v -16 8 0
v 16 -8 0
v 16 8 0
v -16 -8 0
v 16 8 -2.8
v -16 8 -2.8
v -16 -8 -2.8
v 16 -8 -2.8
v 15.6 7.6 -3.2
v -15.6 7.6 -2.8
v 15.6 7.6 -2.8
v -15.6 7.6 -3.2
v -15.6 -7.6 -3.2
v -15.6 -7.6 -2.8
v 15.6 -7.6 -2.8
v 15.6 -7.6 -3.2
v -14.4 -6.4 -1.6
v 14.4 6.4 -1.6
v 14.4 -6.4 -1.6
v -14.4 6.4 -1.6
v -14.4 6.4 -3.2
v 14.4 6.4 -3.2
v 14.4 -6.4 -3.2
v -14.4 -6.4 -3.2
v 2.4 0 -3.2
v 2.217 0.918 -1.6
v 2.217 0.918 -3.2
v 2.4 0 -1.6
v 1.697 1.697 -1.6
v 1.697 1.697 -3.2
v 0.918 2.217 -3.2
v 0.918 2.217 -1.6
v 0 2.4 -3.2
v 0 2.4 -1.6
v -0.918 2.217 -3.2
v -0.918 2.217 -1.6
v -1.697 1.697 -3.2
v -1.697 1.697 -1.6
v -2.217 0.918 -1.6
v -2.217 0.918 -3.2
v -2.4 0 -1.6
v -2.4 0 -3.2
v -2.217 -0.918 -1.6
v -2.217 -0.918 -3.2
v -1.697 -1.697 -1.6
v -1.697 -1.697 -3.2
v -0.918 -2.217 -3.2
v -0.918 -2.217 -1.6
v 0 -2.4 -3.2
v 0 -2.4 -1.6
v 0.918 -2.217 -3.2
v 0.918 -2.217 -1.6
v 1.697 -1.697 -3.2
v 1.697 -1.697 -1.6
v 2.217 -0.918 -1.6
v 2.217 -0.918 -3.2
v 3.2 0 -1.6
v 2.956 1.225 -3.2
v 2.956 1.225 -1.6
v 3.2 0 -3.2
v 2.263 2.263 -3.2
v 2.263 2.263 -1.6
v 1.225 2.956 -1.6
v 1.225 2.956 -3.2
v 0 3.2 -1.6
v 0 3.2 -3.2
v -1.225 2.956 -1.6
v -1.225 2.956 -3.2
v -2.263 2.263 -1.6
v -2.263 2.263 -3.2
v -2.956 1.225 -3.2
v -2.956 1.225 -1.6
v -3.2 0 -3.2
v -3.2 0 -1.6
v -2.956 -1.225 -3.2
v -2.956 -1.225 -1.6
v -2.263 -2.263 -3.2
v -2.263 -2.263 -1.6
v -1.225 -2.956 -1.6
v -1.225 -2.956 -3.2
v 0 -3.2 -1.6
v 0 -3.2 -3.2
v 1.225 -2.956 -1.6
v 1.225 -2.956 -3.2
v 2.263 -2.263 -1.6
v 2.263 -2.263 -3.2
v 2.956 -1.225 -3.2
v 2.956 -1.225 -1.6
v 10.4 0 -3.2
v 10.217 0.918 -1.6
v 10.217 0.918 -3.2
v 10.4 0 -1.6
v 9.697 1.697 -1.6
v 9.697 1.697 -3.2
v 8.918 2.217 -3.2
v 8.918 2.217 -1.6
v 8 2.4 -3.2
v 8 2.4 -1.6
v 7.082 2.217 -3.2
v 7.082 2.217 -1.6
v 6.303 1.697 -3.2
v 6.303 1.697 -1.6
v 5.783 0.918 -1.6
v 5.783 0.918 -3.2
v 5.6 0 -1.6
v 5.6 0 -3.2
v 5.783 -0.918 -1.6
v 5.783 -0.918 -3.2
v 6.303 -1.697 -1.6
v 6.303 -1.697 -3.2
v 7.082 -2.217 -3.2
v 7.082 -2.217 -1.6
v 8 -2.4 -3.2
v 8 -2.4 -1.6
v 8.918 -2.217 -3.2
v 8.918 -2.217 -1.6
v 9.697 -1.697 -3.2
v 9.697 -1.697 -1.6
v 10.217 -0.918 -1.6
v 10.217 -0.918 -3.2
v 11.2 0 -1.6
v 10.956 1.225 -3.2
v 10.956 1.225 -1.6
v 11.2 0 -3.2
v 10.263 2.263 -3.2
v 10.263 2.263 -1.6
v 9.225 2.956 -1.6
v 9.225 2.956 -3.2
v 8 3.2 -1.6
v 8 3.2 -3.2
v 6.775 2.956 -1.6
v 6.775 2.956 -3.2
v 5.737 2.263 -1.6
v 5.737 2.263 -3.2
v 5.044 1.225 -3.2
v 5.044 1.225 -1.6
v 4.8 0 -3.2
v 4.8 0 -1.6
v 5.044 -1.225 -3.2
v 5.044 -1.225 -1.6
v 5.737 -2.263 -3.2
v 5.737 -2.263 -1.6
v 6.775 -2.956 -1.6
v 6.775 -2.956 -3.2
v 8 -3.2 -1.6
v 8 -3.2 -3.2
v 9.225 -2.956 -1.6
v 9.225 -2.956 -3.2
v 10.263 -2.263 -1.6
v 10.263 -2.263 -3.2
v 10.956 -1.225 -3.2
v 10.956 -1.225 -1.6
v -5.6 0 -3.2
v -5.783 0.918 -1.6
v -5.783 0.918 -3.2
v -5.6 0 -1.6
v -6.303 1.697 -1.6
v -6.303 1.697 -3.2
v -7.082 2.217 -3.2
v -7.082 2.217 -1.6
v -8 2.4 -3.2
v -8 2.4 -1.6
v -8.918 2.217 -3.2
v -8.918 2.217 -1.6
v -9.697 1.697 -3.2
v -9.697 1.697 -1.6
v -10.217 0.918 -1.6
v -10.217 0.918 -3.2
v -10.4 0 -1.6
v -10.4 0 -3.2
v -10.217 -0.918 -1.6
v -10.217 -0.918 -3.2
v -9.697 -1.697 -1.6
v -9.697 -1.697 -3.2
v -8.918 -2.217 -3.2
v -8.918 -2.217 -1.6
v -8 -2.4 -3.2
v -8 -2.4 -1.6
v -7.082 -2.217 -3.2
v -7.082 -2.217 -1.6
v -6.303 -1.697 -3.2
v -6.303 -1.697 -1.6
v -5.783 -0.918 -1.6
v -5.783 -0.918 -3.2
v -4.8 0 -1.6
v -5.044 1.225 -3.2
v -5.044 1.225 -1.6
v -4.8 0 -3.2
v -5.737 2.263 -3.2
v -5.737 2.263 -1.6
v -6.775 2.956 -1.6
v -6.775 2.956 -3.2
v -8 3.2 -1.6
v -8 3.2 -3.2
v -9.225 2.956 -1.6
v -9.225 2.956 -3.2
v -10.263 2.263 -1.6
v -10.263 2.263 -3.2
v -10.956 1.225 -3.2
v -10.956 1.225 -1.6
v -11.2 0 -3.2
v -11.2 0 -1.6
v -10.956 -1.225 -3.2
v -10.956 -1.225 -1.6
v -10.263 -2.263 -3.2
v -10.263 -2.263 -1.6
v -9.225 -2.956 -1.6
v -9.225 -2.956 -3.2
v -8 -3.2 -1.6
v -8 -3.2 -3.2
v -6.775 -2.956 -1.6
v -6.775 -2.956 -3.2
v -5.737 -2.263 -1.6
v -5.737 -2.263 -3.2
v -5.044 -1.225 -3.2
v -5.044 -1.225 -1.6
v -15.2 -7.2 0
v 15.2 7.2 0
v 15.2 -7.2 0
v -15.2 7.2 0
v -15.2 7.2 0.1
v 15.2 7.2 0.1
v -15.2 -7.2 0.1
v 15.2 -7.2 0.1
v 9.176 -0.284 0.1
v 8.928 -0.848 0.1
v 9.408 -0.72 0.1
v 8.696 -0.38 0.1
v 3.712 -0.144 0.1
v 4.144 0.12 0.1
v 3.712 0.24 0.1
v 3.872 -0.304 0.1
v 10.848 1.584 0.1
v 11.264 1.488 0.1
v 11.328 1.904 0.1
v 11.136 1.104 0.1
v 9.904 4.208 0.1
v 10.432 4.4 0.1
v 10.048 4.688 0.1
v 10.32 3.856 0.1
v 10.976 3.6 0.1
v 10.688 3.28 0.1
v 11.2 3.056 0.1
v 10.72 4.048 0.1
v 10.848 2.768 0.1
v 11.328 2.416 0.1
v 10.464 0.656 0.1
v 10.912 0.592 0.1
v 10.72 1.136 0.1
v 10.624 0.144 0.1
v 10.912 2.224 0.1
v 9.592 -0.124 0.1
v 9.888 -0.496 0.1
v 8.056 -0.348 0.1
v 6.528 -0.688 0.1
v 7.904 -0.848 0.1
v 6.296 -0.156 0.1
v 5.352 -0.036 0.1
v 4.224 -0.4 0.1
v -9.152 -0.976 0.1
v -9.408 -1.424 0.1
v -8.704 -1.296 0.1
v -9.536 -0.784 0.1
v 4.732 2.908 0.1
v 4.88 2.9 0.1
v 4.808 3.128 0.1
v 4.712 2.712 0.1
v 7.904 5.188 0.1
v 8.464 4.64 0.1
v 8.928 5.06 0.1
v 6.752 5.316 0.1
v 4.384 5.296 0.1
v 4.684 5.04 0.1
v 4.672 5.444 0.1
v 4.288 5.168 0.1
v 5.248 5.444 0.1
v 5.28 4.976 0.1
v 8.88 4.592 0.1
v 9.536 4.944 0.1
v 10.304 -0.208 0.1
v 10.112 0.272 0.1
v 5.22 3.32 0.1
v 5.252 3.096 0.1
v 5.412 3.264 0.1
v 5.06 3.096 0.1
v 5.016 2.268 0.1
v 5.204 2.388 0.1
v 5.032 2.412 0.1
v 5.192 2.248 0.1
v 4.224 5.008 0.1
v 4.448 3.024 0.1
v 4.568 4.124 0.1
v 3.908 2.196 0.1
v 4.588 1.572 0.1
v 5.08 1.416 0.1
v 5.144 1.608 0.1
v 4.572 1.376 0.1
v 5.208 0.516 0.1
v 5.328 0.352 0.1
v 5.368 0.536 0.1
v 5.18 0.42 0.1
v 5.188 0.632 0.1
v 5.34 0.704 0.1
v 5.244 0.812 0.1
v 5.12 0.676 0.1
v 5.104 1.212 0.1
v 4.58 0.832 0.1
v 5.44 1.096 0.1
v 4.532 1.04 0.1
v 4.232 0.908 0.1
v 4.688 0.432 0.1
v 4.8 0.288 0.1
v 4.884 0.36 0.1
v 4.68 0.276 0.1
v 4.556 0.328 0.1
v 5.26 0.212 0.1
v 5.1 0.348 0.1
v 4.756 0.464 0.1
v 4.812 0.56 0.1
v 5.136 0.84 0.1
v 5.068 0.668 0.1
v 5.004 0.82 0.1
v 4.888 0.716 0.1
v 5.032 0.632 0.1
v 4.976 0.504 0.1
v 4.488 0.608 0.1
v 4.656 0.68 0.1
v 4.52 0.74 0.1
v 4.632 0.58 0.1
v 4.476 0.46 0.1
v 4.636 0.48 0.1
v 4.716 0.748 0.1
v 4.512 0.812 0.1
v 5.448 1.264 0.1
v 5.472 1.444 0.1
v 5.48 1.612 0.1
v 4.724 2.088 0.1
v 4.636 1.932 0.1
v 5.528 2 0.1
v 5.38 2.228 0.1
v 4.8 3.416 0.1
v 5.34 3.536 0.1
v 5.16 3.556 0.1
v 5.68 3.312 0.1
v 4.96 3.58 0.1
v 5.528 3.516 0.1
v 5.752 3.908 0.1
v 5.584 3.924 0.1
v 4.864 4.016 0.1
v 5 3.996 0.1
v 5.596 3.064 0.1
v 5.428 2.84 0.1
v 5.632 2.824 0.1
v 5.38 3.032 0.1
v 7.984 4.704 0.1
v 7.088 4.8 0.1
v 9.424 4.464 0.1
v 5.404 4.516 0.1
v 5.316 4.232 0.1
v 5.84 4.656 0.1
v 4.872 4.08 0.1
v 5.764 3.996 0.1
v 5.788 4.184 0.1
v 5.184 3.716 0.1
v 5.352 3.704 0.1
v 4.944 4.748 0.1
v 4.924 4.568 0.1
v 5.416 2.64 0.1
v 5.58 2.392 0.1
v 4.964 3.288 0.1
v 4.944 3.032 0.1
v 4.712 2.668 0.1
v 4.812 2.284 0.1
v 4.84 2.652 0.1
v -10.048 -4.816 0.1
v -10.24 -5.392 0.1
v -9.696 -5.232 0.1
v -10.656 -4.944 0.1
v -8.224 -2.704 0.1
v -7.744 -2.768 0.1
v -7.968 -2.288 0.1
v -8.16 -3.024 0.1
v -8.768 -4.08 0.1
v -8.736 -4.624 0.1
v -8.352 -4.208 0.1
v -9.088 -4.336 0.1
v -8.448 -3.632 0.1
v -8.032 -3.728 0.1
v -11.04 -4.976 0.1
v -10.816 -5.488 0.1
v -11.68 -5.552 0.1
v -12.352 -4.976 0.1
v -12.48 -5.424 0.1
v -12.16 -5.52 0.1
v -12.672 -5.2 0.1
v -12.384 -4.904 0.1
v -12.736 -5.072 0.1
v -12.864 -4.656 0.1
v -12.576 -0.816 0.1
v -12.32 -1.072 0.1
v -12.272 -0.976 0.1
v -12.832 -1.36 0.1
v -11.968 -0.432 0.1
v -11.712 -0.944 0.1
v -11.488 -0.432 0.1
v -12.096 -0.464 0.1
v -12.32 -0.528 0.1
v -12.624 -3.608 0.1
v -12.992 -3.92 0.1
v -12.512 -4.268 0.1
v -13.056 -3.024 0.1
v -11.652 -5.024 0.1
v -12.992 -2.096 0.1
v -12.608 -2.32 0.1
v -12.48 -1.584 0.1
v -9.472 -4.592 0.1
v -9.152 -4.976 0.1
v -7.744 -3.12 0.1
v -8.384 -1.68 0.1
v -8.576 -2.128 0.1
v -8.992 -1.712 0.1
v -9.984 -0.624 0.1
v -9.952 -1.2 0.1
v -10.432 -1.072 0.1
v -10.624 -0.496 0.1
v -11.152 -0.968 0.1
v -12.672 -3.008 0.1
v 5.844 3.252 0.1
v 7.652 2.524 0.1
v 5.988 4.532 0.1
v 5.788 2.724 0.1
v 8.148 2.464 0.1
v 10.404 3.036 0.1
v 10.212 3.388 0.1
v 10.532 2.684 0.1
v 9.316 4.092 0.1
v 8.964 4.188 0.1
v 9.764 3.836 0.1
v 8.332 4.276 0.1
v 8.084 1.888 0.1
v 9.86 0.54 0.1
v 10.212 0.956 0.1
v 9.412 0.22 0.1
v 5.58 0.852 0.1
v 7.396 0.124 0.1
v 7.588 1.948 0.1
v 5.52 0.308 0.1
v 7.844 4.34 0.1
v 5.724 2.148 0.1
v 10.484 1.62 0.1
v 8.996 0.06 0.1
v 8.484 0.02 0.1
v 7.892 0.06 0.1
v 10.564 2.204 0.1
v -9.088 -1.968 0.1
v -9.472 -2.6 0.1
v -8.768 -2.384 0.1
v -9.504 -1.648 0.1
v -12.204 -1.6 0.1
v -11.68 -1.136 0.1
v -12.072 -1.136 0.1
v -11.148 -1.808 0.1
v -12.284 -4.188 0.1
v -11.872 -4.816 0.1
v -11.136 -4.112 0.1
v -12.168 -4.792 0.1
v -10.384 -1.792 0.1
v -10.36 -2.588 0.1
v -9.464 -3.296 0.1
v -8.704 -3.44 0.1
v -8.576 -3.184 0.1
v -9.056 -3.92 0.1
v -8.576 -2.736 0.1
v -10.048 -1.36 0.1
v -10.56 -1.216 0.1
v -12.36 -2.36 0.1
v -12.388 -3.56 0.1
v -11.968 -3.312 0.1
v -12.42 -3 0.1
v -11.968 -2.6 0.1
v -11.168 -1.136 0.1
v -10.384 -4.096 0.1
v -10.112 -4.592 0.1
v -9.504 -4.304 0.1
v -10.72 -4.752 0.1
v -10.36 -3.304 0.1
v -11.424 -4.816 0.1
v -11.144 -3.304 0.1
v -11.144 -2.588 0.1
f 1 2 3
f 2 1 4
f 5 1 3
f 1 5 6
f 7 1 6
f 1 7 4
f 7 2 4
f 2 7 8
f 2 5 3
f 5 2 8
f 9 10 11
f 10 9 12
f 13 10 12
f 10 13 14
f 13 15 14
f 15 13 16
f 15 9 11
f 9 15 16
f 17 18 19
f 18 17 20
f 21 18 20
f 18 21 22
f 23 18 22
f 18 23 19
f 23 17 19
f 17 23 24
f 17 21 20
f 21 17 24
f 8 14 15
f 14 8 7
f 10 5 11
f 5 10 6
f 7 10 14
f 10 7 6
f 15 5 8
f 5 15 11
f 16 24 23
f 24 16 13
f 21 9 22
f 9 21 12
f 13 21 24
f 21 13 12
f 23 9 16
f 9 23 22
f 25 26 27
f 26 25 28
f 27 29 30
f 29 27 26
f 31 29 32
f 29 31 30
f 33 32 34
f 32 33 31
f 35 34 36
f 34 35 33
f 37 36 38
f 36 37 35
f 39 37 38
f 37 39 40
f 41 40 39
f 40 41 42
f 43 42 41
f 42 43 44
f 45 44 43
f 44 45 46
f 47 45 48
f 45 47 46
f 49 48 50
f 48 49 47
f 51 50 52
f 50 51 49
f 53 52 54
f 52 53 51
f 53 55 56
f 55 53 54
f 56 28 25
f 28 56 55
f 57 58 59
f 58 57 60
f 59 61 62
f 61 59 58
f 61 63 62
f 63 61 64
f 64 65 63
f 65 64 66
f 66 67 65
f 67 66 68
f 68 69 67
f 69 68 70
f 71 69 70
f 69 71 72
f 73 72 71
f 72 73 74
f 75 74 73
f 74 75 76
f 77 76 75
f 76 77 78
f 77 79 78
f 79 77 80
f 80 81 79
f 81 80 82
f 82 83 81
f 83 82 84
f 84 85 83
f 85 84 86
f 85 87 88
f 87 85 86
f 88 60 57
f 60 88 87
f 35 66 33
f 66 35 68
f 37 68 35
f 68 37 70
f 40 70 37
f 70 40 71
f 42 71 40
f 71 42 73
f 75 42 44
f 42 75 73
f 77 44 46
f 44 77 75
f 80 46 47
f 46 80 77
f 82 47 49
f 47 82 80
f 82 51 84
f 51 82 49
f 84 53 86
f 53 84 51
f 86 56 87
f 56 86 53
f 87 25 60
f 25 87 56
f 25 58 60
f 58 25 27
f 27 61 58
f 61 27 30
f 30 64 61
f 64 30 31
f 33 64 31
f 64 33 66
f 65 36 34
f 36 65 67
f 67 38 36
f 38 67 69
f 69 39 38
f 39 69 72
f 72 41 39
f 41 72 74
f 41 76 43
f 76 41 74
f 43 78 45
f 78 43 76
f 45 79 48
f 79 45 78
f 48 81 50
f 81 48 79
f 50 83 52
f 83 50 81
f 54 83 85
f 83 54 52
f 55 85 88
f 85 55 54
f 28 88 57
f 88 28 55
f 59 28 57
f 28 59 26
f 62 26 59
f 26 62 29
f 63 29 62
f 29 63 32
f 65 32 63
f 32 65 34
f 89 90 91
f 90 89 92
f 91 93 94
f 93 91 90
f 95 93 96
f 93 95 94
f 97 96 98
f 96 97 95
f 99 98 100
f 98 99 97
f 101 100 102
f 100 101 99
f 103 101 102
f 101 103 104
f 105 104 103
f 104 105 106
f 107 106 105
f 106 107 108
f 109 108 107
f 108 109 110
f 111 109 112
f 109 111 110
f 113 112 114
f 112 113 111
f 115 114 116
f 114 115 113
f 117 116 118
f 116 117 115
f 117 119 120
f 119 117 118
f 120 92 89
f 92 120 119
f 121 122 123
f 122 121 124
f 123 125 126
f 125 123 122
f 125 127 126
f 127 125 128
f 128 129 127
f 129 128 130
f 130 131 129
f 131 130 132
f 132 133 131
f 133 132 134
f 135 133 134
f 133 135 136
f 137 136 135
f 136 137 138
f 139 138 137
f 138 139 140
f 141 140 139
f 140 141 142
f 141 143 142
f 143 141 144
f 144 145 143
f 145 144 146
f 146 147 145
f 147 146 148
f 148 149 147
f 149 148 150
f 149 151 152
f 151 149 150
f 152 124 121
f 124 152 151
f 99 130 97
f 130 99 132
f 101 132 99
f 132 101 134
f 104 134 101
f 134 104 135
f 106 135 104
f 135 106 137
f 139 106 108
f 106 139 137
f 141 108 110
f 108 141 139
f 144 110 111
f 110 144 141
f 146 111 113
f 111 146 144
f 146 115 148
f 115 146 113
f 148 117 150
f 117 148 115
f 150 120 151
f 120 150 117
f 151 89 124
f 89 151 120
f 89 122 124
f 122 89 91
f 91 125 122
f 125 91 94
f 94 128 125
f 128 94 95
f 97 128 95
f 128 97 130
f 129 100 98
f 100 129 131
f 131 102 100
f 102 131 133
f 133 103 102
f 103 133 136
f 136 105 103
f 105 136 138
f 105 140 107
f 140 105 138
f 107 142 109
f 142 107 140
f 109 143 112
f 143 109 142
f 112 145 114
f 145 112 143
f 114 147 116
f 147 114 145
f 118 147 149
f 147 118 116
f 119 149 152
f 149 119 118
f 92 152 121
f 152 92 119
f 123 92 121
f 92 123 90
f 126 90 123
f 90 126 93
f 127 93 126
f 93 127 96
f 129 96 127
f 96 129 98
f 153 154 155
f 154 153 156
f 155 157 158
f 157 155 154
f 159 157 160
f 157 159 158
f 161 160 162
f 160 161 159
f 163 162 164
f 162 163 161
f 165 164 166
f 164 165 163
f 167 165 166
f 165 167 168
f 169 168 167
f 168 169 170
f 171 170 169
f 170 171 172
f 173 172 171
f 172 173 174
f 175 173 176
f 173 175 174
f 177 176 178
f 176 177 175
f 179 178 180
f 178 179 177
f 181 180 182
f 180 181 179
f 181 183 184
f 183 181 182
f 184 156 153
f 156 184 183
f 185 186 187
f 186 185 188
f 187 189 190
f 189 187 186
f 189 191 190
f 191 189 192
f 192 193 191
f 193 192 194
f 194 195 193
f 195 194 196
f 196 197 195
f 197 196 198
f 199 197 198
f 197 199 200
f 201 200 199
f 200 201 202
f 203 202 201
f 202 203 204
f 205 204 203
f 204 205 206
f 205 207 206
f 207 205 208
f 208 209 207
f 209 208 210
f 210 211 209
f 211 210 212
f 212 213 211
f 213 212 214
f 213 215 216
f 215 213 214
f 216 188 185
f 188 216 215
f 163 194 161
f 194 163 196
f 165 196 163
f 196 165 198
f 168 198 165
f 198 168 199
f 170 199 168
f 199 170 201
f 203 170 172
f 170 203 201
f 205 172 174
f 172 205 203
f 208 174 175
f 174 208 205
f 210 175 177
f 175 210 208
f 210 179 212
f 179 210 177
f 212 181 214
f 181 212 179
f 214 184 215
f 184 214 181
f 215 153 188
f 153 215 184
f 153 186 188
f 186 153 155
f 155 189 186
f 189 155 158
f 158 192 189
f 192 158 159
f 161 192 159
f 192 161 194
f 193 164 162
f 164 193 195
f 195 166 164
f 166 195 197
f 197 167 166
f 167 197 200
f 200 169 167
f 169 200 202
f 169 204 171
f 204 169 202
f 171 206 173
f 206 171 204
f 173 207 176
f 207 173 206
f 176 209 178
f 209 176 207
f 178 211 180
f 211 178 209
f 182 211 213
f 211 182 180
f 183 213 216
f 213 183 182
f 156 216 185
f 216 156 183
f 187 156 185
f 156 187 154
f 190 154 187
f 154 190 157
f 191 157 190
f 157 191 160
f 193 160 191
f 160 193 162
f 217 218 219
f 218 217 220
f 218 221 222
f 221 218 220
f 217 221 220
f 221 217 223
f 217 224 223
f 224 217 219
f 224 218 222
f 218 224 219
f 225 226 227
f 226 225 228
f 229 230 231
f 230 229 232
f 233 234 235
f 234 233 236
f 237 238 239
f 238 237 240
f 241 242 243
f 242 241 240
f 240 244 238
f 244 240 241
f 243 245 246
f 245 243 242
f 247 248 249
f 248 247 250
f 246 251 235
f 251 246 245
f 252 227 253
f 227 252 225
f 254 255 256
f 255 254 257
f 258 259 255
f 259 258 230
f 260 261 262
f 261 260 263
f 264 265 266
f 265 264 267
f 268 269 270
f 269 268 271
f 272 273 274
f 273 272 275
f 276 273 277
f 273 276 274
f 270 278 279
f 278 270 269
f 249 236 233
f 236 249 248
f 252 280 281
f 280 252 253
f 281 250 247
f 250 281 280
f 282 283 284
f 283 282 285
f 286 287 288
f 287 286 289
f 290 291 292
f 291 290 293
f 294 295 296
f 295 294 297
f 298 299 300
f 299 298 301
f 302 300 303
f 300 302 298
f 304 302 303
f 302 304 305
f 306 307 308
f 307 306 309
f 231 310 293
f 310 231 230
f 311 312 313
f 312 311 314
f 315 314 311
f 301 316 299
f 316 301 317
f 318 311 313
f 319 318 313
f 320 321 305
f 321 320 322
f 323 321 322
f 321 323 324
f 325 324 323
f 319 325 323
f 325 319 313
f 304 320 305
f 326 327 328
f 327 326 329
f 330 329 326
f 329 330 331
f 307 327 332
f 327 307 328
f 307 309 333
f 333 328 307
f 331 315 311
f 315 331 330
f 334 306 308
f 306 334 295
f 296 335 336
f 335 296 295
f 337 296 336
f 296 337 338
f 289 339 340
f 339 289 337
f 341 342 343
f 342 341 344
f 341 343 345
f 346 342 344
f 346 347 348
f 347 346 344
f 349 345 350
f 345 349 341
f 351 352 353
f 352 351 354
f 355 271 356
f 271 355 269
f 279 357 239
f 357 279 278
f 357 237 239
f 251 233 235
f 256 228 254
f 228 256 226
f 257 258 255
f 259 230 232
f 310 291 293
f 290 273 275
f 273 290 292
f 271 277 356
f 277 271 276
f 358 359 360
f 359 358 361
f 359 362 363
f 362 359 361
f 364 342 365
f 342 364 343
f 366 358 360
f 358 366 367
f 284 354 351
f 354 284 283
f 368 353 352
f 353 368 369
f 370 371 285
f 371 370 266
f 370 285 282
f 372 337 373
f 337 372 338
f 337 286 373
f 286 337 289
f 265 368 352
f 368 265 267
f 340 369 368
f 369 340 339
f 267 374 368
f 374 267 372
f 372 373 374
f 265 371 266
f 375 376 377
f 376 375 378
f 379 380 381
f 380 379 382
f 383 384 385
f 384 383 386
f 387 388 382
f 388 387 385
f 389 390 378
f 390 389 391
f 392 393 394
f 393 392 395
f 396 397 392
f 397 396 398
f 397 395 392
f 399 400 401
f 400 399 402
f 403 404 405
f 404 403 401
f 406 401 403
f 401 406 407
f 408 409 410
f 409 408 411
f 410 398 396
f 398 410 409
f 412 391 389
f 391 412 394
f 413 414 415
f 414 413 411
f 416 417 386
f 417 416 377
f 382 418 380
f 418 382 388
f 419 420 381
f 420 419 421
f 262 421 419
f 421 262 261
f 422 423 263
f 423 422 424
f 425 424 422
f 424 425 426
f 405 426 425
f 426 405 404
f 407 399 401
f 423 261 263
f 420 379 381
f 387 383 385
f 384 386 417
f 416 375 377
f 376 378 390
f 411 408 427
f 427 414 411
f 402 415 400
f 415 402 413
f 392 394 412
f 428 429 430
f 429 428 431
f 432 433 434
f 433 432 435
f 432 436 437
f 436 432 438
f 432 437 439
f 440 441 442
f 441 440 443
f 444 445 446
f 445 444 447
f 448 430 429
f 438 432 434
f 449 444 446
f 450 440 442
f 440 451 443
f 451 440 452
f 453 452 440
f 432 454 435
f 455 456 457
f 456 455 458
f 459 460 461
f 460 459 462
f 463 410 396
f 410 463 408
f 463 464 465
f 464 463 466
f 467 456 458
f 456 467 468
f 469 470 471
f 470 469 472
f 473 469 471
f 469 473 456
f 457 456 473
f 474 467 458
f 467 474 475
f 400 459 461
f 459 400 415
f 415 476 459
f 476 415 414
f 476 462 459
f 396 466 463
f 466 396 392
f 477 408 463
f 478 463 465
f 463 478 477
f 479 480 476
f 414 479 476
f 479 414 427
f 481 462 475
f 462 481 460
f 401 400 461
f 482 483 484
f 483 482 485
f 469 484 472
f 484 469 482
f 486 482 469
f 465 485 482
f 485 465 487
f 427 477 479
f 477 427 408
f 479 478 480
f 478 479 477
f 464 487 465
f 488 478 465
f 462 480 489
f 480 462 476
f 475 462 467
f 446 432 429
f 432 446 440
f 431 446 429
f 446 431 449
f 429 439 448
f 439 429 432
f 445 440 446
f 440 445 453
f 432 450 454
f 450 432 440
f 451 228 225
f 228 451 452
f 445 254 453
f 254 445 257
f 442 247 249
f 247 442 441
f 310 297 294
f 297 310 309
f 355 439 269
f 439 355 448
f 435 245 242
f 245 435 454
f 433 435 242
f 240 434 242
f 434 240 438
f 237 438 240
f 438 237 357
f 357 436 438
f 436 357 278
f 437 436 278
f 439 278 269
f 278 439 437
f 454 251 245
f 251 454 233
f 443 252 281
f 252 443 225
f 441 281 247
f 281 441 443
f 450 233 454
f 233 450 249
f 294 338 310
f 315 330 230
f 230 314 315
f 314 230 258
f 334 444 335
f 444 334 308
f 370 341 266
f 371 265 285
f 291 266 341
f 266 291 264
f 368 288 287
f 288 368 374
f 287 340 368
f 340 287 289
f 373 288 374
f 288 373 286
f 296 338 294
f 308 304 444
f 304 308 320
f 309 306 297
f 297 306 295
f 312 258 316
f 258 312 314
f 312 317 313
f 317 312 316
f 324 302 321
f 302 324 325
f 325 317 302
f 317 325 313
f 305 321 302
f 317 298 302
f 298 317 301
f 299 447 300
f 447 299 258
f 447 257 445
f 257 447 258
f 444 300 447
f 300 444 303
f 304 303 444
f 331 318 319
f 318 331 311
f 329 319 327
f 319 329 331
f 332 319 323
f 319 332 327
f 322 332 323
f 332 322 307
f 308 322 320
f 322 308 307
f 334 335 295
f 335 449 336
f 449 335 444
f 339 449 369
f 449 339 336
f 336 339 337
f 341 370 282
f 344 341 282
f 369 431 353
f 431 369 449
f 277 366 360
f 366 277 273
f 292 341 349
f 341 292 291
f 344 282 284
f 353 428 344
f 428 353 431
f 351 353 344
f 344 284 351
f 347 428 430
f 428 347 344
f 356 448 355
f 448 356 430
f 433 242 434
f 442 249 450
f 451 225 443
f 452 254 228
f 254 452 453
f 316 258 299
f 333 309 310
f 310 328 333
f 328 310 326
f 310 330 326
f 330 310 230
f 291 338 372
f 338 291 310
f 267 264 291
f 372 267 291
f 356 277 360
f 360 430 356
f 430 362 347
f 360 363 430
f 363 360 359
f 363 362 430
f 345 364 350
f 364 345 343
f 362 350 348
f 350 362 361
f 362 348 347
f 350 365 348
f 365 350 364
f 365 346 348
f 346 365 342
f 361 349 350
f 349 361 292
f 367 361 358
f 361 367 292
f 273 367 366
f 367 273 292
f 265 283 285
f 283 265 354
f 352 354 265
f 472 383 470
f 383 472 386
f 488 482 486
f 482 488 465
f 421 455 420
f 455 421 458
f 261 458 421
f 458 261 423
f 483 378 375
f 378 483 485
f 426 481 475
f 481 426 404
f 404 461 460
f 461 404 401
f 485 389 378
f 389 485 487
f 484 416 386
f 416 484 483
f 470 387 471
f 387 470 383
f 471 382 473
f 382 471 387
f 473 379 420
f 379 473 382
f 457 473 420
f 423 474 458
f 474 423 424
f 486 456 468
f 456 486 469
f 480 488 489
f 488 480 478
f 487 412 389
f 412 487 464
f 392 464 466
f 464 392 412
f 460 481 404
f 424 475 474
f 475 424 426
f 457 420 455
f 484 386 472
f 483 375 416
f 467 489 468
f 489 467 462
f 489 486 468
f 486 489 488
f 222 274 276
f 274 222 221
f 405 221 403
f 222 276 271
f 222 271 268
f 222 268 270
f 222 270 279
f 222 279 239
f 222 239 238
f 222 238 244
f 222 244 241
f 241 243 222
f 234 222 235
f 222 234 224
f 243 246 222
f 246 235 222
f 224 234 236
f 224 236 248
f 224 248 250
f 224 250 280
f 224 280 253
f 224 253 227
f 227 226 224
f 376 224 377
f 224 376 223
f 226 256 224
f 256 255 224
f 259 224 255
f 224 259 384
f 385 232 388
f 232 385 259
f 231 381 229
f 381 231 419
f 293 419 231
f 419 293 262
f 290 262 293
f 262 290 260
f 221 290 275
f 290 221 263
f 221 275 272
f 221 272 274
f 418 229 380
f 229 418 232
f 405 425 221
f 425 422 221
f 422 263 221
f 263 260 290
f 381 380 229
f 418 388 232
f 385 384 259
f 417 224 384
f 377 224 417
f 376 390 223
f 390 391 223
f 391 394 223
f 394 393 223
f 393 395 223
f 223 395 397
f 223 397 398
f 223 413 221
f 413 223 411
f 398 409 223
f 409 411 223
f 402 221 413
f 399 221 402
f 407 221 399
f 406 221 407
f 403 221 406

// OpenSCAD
use <../lib.scad>
use <6296256a.scad>
use <87079.scad>
function ldraw_lib__87079d19() = [
// 0 Tile  2 x  4 with Switzerland and Sweden Stickers on Medium Nougat Background Sticker
// 0 Name: 87079d19.dat
// 0 Author: Evert-Jan Boer [ejboer]
// 0 !LDRAW_ORG Shortcut UPDATE 2026-07
// 0 !LICENSE Licensed under CC BY 4.0 : see CAreadme.txt
// 
// 0 BFC CERTIFY CCW
  [0,"BFC","CERTIFY"],
  [0,"BFC","CCW"],
// 
// 0 !CATEGORY Sticker Shortcut
// 0 !KEYWORDS Bricklink 87079pb0902, Fiat 500, set 10271
// 
// 0 !HISTORY 2026-07-30 [OrionP] Official Update 2026-07
// 
// 1 16 0 0 0 1 0 0 0 1 0 0 0 1 87079.dat
  [1,16,0,0,0,1,0,0,0,1,0,0,0,1, ldraw_lib__87079()],
// 1 16 0 0 0 1 0 0 0 1 0 0 0 1 6296256a.dat
  [1,16,0,0,0,1,0,0,0,1,0,0,0,1, ldraw_lib__6296256a()],
];
module ldraw_lib__87079d19(step=0, col=false, unit=2/5, alt=false, line=0.2, solid=!$preview)
    makepoly(ldraw_lib__87079d19(), step=step, col=col, unit=unit, alt=alt, line=line, solid=solid);
ldraw_lib__87079d19(line=0.2);
